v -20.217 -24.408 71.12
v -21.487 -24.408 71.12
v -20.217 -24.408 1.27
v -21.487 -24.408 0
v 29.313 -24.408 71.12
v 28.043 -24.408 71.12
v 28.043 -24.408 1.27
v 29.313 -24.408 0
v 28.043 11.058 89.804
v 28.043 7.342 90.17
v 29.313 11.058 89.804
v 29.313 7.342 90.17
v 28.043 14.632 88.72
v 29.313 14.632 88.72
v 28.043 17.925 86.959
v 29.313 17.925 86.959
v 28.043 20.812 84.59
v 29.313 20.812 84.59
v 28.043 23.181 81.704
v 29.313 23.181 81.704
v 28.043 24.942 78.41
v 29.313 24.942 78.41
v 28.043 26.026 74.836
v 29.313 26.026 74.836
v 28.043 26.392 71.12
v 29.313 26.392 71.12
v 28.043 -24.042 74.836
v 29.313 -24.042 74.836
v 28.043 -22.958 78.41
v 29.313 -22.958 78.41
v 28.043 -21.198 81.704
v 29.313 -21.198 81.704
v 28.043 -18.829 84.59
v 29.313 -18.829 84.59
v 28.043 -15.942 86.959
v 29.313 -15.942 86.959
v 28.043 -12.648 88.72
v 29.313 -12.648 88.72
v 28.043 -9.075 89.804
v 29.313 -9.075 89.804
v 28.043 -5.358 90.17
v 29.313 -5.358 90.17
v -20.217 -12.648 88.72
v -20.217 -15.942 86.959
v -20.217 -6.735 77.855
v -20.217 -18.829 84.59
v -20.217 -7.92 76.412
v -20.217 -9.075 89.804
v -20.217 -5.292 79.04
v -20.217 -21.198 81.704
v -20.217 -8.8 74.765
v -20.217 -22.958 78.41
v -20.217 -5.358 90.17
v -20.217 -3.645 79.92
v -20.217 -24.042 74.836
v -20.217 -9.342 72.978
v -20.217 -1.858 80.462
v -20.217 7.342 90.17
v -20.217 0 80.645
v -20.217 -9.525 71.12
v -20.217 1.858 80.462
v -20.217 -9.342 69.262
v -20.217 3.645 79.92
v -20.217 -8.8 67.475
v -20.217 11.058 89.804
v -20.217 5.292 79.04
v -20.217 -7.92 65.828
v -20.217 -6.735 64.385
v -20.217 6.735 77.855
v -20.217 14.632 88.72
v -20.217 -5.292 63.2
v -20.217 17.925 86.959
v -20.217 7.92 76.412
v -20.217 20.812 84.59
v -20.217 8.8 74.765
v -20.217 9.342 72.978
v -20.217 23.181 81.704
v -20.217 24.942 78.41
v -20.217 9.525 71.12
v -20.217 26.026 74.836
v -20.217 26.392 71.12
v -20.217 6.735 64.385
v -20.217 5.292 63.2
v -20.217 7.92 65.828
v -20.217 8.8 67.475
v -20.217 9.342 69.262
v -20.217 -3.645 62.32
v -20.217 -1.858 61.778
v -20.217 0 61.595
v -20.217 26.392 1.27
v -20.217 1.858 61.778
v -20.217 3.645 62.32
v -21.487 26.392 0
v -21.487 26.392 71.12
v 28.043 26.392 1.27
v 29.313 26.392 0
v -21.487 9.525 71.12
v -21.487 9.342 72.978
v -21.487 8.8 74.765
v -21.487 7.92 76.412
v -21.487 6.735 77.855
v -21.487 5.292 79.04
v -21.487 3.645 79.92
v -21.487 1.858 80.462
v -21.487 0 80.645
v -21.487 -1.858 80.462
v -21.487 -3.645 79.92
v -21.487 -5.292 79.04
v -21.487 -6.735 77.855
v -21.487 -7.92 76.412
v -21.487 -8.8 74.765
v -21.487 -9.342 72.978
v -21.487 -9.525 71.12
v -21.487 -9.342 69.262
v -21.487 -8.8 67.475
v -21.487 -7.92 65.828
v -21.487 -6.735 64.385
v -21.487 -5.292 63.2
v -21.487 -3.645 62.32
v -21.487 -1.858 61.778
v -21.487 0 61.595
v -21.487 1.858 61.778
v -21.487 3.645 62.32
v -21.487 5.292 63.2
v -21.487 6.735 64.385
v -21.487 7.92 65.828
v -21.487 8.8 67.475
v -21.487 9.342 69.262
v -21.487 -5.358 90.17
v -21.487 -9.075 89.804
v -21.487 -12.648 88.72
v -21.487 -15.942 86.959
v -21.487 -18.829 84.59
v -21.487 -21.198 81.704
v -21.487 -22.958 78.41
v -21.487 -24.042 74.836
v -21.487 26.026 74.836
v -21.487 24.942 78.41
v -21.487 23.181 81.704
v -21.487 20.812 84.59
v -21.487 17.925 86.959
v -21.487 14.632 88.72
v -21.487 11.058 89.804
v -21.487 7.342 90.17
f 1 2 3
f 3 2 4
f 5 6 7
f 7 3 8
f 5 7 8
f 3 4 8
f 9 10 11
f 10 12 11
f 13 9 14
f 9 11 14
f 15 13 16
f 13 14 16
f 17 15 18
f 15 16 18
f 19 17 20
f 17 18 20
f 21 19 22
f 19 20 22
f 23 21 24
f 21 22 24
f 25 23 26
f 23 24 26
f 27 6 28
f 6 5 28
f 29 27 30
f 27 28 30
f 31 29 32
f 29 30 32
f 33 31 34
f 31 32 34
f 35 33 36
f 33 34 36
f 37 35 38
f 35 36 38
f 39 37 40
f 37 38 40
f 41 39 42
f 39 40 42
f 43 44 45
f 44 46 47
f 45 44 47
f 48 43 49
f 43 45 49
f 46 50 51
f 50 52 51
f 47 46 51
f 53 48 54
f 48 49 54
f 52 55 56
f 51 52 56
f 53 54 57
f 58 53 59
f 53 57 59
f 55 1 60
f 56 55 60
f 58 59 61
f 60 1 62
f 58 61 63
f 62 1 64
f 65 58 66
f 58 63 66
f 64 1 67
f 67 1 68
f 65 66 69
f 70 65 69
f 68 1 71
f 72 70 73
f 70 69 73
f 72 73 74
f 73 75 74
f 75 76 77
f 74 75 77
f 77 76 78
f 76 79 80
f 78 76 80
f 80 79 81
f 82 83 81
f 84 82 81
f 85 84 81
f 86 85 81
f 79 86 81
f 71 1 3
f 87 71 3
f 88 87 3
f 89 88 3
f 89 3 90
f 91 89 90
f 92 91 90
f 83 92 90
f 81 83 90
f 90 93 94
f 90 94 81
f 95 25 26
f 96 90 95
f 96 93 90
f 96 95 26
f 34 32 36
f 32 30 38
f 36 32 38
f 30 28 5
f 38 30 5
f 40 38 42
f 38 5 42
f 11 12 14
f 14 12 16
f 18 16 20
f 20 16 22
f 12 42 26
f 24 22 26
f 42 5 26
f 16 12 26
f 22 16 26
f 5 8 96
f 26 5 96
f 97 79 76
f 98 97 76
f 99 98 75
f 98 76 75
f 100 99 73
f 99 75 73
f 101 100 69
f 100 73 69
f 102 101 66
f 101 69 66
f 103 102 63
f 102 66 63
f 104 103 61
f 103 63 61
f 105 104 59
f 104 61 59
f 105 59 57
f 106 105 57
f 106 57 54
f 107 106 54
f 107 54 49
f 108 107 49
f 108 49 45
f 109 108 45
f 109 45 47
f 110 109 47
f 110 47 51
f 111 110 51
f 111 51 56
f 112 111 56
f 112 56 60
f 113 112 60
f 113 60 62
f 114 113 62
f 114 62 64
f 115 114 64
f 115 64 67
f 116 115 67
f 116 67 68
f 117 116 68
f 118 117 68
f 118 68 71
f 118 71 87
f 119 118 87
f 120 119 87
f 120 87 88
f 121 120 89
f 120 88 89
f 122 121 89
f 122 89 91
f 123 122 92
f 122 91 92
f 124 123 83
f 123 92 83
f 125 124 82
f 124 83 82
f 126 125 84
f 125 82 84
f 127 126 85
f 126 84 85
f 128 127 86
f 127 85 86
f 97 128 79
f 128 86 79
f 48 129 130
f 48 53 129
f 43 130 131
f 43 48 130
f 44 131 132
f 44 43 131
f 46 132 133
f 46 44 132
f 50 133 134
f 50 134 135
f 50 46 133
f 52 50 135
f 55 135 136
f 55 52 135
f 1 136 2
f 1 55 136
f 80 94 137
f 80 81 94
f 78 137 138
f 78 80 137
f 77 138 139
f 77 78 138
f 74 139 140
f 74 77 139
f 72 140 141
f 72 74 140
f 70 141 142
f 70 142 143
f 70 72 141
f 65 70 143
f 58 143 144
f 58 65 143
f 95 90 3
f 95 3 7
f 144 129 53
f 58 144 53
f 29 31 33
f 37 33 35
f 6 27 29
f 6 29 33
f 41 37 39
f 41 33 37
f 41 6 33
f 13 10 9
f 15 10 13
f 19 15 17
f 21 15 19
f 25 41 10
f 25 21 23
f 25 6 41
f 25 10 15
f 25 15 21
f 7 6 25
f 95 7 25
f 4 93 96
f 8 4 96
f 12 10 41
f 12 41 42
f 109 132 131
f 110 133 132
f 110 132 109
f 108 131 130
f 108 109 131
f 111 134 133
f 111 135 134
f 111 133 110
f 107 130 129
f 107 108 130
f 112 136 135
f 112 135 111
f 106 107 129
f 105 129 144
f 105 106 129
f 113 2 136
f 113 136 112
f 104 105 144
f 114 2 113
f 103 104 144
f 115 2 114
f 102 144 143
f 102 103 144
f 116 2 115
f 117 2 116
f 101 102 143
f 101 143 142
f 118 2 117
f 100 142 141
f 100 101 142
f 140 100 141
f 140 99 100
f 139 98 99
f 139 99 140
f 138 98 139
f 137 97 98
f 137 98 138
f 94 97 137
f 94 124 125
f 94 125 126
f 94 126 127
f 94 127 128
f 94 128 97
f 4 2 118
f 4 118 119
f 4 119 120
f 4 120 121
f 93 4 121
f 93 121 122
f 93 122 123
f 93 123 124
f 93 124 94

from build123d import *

# Parameters (mm, degrees)
F0_W     = 50.8
F0_H     = 50.8
F1_DEPTH = 1.27
F2_W     = 1.27
F2_H     = 50.8
F3_DEPTH = 88.9
F4_R     = 19.05
F5_R     = 19.05
F7_D     = 19.05
F7_DEPTH = 1.271


with BuildPart() as f1:
    # F0 (on Top) → F1 (new body)
    with BuildSketch(Plane.XY):
        with Locations((3.9132147372, 0.9917675793)):
            Rectangle(F0_W, F0_H)
    extrude(amount=F1_DEPTH)

    # F2 (on face) → F3 (join)
    with BuildSketch(Plane.XY.offset(1.27)):
        with Locations((-20.8517852628, 0.9917675793)):
            Rectangle(F2_W, F2_H)
        with Locations((28.6782147372, 0.9917675793)):
            Rectangle(F2_W, F2_H)
    extrude(amount=F3_DEPTH)

    # F4
    f4_edges = [f1.edges().sort_by_distance(p)[0] for p in [
        (28.678215, 26.391768, 90.17),
        (-20.851785, 26.391768, 90.17),
    ]]
    fillet(f4_edges, radius=F4_R)

    # F5
    f5_edges = [f1.edges().sort_by_distance(p)[0] for p in [
        (-20.851785, -24.408232, 90.17),
        (28.678215, -24.408232, 90.17),
    ]]
    fillet(f5_edges, radius=F5_R)

    # F7 (through all, one way)
    with BuildSketch(Plane.YZ.offset(-20.2167852628)):
        with Locations((0, 71.12)):
            Circle(F7_D / 2)
    extrude(amount=-F7_DEPTH, mode=Mode.SUBTRACT)


solid = f1.part
